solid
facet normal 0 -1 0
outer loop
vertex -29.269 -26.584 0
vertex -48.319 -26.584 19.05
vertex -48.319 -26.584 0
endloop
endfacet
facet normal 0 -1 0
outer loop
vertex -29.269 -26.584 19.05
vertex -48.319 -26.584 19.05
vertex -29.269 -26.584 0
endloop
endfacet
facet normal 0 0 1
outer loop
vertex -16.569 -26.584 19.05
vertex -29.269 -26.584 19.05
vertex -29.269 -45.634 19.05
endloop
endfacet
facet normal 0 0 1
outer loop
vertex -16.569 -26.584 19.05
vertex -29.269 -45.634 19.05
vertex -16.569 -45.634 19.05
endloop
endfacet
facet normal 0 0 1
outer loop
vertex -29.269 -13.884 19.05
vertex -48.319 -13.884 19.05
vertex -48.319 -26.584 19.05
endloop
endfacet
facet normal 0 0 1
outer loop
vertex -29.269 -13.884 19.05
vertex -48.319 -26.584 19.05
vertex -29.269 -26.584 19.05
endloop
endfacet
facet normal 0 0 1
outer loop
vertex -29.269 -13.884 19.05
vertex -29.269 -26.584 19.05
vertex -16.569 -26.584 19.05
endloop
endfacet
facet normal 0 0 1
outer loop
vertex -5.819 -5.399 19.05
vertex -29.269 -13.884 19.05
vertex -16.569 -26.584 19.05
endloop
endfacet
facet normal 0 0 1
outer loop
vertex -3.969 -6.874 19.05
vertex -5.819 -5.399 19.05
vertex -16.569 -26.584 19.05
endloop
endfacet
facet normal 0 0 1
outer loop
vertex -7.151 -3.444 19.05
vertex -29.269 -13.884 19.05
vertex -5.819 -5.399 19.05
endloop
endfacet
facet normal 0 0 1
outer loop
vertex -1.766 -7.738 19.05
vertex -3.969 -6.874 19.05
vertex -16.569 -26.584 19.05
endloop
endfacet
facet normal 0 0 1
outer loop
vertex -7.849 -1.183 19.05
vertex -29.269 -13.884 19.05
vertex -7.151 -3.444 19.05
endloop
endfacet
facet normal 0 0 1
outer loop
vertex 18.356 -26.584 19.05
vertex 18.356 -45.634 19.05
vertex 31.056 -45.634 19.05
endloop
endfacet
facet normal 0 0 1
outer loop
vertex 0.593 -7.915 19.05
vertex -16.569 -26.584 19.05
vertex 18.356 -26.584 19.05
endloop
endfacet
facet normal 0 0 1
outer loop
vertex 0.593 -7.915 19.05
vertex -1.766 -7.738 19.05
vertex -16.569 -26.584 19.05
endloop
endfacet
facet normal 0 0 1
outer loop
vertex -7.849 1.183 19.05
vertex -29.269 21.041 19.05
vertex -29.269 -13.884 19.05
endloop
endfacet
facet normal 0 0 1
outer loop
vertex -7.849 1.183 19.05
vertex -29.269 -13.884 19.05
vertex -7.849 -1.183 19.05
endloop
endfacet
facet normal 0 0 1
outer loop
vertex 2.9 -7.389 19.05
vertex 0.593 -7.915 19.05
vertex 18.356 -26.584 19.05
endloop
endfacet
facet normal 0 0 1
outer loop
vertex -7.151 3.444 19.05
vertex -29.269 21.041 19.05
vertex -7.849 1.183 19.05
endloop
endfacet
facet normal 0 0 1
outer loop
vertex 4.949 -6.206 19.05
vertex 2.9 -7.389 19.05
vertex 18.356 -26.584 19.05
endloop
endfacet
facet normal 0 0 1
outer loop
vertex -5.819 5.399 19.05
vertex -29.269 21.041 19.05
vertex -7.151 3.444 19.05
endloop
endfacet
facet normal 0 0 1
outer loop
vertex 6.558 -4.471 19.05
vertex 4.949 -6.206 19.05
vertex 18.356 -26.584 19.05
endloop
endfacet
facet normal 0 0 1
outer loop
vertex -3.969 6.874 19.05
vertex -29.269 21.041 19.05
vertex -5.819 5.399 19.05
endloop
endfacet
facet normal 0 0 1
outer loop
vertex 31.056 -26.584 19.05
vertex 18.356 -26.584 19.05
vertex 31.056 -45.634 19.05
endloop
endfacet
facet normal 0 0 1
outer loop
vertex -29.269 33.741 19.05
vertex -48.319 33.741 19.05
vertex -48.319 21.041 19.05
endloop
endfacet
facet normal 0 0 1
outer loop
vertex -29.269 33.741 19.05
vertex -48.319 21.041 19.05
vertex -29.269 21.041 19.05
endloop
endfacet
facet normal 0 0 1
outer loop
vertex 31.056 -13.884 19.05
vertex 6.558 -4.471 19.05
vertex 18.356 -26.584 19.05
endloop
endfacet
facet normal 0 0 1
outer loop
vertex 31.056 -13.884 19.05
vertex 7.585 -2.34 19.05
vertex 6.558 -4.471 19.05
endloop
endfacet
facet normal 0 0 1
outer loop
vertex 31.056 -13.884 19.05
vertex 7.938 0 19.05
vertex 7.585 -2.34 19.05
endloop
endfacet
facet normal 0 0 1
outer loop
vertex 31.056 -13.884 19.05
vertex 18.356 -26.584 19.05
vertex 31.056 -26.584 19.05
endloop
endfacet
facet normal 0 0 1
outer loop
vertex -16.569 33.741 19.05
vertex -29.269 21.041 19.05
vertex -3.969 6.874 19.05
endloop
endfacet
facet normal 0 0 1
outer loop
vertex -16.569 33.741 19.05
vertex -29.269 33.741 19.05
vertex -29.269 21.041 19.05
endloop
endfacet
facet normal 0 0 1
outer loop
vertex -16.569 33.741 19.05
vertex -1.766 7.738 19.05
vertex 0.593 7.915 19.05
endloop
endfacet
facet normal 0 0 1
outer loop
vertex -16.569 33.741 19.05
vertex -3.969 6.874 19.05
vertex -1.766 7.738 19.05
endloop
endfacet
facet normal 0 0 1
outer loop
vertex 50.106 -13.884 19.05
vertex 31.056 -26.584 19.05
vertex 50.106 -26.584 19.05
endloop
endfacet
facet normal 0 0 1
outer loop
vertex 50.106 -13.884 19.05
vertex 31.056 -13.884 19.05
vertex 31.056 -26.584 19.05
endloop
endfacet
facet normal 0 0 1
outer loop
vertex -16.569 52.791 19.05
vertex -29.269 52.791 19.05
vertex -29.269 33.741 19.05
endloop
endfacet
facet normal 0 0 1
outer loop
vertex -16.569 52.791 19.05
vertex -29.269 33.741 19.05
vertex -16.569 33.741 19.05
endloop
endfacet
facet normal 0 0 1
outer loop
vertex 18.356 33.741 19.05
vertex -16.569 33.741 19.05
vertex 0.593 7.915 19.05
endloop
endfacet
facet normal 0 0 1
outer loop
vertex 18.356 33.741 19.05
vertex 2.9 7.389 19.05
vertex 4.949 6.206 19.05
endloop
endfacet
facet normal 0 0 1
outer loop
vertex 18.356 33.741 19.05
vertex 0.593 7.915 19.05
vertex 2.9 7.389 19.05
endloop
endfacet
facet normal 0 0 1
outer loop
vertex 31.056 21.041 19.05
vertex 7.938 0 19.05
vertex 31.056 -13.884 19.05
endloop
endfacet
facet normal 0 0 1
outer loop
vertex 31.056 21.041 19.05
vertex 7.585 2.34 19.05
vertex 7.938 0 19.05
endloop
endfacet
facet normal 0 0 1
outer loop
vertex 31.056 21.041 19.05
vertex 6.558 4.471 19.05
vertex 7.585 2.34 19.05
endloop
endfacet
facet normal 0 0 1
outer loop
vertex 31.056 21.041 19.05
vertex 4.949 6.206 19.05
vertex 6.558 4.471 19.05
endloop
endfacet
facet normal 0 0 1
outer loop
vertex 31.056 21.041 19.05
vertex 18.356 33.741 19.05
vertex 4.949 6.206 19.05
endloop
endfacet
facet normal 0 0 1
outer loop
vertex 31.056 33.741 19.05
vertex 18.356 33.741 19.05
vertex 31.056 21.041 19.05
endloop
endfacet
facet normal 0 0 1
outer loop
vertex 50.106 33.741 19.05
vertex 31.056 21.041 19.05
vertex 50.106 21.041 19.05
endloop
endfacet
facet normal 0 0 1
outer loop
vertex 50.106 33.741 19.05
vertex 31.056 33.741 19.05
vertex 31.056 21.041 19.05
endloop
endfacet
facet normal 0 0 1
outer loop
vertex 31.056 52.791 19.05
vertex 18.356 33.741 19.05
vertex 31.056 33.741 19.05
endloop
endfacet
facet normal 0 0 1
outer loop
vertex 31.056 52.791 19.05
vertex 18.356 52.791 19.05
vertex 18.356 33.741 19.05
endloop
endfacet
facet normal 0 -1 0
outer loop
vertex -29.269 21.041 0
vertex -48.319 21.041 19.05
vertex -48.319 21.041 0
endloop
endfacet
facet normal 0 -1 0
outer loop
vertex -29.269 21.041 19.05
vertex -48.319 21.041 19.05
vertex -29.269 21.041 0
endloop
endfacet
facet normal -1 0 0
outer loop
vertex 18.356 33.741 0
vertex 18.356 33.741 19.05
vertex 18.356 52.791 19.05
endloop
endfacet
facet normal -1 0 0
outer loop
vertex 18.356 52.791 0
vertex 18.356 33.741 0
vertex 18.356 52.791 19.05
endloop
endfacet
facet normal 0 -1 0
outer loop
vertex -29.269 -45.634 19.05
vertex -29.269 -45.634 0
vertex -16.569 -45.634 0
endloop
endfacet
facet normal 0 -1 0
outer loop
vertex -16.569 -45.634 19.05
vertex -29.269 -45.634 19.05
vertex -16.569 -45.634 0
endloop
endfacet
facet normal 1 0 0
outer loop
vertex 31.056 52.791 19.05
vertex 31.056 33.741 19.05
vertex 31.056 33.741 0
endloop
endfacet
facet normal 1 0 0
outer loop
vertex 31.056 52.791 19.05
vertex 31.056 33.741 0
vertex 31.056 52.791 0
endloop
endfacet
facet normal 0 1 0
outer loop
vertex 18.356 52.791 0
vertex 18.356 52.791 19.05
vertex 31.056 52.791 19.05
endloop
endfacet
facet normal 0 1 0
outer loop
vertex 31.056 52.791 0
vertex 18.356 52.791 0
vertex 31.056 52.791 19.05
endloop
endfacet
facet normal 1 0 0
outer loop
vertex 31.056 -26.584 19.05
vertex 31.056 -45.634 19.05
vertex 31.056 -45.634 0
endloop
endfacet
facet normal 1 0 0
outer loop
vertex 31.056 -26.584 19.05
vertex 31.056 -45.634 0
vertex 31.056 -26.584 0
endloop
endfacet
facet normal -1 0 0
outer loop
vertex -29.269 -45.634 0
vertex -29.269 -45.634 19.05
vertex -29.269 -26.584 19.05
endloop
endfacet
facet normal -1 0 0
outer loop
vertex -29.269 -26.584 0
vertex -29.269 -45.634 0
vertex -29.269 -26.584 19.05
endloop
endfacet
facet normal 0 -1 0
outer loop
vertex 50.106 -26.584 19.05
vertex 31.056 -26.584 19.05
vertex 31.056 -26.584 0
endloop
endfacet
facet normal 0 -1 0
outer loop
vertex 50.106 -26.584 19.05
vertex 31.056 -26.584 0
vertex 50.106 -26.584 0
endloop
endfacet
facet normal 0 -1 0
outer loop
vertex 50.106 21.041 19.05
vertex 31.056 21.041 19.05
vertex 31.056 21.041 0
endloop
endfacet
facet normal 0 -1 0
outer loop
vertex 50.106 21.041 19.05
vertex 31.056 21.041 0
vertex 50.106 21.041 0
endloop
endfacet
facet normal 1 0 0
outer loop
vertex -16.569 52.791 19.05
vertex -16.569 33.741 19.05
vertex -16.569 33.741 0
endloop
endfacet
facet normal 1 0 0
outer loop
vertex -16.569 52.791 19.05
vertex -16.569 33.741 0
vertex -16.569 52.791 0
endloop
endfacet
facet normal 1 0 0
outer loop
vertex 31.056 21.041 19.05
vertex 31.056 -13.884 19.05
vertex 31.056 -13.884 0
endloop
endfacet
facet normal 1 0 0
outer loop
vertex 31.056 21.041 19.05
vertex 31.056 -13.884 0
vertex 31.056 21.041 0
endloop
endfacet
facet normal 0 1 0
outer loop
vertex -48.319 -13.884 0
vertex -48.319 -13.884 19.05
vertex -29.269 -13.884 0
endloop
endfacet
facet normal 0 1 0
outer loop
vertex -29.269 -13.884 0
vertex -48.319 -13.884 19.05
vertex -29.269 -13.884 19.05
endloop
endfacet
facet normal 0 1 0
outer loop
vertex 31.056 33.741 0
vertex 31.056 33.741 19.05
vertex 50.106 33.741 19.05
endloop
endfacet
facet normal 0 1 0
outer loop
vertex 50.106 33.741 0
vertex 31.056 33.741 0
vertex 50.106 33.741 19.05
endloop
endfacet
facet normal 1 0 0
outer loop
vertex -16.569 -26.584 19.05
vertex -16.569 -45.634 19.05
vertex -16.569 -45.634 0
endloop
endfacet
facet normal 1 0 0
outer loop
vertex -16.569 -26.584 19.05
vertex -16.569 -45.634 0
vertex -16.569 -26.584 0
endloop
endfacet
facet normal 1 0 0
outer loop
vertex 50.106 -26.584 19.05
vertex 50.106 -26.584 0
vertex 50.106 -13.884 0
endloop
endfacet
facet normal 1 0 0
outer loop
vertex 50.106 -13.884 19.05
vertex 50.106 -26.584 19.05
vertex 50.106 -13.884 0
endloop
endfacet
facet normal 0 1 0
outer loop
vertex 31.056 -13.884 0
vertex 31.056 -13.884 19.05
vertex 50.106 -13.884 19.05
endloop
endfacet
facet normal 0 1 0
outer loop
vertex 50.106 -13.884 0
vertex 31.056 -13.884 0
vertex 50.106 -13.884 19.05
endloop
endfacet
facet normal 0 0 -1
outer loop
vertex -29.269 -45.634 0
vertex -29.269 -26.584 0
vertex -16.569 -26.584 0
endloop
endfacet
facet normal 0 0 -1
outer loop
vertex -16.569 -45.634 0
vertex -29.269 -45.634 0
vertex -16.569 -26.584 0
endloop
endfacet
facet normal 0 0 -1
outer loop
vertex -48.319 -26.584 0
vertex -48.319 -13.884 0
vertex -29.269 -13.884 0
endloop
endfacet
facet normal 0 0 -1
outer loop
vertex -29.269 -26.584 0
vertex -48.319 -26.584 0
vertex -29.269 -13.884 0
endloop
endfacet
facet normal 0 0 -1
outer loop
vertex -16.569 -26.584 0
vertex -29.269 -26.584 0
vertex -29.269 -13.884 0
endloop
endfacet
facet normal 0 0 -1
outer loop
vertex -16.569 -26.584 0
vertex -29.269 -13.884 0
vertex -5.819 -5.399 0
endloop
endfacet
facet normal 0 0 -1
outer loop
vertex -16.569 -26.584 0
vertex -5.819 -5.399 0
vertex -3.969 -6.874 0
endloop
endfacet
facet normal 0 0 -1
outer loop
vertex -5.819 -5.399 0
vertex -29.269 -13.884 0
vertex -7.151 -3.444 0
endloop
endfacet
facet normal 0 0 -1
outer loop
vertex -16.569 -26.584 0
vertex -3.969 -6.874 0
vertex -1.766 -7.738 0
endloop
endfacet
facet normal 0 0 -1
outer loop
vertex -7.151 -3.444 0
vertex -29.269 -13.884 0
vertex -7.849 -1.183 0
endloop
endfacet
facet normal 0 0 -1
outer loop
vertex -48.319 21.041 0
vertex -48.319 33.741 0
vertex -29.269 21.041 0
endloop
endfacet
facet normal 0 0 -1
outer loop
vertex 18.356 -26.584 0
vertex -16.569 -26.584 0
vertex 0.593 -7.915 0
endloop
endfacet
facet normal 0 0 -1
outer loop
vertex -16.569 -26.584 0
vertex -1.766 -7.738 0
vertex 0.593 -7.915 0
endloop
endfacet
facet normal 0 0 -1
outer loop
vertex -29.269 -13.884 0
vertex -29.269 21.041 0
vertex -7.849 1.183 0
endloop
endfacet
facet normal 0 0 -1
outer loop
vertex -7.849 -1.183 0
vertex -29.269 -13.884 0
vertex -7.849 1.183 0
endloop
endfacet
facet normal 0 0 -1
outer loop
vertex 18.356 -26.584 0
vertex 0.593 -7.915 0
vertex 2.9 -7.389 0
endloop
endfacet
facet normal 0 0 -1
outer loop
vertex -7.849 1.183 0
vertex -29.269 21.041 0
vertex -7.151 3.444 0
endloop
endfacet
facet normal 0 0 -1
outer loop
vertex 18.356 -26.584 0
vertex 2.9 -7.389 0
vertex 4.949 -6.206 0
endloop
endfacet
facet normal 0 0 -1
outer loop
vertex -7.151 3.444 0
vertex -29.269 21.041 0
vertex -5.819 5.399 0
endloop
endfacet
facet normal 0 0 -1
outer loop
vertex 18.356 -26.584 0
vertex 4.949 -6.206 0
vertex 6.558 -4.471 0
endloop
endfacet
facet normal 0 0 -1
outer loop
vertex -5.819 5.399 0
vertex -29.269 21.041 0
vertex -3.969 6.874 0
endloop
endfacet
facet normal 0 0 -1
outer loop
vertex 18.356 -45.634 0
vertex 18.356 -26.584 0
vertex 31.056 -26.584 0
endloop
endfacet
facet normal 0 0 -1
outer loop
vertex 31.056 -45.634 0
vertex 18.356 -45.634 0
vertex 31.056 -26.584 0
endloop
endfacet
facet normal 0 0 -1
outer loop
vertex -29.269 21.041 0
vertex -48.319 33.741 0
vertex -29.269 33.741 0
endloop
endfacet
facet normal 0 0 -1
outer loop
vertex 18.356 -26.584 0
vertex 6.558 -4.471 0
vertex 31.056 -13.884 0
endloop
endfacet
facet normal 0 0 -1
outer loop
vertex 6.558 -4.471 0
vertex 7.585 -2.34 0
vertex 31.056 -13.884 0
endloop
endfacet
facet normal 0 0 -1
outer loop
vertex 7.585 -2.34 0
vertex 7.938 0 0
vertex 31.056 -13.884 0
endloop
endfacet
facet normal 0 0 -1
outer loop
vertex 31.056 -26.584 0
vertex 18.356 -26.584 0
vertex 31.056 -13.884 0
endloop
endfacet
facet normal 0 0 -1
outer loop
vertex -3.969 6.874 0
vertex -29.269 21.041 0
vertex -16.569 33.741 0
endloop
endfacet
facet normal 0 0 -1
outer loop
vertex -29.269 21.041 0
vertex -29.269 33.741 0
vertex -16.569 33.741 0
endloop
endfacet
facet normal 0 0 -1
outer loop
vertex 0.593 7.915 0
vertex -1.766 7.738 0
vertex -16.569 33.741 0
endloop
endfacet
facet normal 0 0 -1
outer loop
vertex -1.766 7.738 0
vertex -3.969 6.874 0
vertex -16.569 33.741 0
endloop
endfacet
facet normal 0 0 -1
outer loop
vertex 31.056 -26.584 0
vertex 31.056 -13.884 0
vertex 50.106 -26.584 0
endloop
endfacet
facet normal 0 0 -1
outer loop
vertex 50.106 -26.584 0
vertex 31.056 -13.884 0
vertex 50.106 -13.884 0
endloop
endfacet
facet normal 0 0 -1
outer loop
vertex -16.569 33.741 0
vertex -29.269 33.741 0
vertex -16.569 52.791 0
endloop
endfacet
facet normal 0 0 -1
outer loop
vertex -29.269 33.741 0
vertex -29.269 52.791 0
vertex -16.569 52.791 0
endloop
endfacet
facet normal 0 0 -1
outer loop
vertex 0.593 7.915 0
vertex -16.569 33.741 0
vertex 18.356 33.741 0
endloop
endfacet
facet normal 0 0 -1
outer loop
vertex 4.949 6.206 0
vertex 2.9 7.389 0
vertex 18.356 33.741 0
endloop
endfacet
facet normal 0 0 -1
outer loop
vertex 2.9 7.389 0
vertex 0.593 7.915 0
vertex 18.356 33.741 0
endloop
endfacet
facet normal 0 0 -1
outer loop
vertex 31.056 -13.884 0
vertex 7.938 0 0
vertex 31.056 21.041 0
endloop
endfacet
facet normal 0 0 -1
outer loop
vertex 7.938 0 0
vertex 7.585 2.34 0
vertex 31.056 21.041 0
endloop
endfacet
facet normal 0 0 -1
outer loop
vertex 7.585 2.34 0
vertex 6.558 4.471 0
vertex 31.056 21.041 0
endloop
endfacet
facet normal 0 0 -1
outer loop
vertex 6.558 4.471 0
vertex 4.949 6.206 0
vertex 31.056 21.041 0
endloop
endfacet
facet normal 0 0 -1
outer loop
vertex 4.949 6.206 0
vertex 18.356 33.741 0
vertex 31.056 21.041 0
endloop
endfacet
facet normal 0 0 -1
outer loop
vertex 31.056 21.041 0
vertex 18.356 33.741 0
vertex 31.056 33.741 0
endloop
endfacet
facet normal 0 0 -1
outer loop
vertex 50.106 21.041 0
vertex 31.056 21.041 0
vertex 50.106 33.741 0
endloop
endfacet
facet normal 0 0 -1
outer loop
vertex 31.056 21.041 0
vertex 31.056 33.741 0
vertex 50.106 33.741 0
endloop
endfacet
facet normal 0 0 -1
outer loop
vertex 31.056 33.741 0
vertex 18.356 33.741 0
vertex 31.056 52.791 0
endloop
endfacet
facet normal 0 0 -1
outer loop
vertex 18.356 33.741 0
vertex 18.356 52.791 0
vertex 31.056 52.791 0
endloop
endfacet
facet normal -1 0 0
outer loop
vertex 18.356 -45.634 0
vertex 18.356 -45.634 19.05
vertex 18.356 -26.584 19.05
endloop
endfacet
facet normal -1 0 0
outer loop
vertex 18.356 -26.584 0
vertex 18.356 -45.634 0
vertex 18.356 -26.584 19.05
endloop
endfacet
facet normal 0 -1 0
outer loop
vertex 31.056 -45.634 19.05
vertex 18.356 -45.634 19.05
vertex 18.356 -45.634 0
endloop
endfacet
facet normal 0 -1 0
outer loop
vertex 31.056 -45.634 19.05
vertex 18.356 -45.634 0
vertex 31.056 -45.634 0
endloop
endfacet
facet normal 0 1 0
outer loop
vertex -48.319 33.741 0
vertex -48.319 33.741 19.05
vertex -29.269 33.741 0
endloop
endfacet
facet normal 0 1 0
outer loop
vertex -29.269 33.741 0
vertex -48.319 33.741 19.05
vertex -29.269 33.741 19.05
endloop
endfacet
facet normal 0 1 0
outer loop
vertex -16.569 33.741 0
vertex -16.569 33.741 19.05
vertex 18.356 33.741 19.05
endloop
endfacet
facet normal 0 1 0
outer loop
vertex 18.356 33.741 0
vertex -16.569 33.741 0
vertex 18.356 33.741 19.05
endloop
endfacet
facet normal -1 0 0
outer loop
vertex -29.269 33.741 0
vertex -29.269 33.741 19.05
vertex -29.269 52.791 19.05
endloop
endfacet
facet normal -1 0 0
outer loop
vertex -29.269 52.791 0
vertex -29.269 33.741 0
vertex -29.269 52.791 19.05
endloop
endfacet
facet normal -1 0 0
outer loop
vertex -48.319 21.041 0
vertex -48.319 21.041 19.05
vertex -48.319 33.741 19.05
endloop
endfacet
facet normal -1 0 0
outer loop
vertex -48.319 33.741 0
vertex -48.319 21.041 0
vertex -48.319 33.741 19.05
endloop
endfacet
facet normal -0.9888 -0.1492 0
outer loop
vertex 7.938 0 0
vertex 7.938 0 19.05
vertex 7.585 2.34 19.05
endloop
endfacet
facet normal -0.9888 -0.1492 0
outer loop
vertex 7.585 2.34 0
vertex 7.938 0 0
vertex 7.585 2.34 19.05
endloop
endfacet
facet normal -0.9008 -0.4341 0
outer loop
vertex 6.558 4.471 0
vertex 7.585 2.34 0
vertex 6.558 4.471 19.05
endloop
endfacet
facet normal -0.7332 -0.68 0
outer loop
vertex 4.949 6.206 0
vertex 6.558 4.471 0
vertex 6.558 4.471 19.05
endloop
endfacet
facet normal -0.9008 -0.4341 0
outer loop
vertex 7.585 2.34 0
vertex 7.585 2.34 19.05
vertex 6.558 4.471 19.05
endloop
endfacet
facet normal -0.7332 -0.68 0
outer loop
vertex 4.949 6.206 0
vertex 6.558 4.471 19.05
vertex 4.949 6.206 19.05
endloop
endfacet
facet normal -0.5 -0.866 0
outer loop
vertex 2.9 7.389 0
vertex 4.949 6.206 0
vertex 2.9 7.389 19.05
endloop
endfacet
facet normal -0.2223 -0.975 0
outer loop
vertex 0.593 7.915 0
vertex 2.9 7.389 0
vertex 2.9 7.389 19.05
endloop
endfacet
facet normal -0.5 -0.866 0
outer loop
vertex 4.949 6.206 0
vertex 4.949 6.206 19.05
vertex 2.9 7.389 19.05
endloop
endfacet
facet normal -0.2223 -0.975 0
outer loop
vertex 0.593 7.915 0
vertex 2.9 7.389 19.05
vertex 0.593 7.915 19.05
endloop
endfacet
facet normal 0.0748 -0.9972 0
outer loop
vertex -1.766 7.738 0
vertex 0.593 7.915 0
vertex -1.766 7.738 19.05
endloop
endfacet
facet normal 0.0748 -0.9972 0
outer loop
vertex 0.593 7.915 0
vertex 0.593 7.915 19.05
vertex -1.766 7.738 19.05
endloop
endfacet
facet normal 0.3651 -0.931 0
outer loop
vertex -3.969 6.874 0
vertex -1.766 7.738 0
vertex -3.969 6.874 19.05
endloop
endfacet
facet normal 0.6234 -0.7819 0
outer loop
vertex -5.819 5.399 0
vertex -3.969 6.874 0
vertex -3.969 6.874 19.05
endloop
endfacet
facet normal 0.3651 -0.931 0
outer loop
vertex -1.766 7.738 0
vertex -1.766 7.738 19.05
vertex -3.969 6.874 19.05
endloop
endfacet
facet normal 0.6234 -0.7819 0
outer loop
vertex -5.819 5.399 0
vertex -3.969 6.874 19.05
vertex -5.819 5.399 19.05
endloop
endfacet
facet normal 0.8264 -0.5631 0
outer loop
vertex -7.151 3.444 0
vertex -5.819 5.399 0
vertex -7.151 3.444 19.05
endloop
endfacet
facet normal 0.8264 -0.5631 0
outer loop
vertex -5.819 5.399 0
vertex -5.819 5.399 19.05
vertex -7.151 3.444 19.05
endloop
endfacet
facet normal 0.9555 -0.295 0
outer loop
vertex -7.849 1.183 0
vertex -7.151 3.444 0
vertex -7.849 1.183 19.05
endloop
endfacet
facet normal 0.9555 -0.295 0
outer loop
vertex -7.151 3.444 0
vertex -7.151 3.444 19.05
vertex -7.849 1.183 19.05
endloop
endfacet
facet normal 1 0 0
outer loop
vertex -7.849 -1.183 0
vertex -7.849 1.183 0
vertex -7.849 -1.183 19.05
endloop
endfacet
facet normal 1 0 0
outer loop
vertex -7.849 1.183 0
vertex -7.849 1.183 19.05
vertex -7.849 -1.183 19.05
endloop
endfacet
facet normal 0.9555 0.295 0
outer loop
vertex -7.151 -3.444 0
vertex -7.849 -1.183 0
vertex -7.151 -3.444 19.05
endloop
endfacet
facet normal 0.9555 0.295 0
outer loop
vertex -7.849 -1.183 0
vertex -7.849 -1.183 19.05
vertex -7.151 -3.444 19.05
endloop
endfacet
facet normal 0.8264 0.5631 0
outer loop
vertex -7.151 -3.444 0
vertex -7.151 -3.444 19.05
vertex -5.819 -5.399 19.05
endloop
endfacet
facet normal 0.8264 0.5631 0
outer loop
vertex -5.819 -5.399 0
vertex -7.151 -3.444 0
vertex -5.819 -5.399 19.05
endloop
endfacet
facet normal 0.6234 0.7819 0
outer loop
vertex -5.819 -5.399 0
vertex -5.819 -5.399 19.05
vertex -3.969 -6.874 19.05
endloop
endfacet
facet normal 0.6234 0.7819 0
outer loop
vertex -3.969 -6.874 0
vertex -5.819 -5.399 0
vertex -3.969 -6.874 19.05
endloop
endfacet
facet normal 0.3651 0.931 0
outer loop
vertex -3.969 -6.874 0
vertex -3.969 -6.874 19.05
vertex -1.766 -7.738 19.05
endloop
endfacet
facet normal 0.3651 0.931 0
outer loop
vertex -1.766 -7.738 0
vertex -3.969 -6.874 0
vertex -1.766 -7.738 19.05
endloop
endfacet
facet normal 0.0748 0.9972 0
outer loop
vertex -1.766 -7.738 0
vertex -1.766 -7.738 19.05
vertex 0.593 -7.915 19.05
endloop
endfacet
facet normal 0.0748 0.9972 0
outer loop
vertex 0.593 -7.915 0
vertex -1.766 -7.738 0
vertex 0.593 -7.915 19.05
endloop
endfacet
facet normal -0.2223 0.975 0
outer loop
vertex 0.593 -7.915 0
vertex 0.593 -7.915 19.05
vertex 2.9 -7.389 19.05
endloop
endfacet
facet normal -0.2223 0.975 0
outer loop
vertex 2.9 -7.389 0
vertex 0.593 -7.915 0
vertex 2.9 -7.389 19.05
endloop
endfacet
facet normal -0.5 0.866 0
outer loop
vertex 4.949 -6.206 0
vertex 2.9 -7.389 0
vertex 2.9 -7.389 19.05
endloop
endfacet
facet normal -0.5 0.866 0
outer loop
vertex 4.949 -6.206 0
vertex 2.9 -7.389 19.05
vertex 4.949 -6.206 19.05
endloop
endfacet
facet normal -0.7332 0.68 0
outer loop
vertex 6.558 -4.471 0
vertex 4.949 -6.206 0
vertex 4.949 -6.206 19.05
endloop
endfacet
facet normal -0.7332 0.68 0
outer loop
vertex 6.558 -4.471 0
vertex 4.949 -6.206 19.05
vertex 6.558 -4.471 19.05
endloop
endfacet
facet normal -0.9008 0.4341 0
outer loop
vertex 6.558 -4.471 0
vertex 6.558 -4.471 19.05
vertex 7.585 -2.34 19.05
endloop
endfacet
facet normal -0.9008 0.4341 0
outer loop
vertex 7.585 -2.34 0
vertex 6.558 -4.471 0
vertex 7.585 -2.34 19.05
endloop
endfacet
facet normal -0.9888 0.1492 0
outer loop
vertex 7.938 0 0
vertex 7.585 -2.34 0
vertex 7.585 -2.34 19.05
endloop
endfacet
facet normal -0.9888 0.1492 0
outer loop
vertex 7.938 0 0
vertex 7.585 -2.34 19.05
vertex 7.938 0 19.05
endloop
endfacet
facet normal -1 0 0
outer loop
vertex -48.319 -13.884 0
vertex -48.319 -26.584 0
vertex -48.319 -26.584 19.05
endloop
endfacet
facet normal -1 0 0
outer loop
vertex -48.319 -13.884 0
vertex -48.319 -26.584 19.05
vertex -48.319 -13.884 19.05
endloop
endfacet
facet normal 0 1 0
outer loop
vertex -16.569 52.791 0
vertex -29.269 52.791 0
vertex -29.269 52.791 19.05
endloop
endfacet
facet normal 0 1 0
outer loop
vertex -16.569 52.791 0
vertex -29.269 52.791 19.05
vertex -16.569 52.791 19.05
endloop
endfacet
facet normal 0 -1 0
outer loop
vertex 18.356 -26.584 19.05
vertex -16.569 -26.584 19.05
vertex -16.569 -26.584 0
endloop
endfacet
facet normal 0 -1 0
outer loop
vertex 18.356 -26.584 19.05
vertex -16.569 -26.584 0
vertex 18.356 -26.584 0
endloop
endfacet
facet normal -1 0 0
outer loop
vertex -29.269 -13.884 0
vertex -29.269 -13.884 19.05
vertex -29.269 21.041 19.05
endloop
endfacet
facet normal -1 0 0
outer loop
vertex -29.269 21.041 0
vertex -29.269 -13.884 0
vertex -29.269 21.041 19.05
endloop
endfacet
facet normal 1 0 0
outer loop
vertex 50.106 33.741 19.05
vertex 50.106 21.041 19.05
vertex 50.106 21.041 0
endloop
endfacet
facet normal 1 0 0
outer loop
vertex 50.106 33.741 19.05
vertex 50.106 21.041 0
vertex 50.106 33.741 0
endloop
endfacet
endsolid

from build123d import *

# Parameters (mm, degrees)
F0_W     = 98.425
F0_H     = 98.425
F1_DEPTH = 19.05
F2_W     = 19.05
F2_H     = 19.05
F2_H_2   = 34.925
F2_W_2   = 34.925
F3_DEPTH = 19.051
F4_R     = 7.9375
F5_DEPTH = 19.051


with BuildPart() as f1:
    # F0 (on Top) → F1 (new body)
    with BuildSketch(Plane.XY):
        with Locations((0.8939672261, 3.5788302732)):
            Rectangle(F0_W, F0_H)
    extrude(amount=F1_DEPTH)

    # F2 (on face) → F3 (cut, through all)
    with BuildSketch(Plane.XY.offset(19.05)):
        with Locations((-38.7935327739, 43.2663302732)):
            Rectangle(F2_W, F2_H)
        with Locations((40.5814672261, 43.2663302732)):
            Rectangle(F2_W, F2_H)
        with Locations((-38.7935327739, -36.1086697268)):
            Rectangle(F2_W, F2_H)
        with Locations((40.5814672261, -36.1086697268)):
            Rectangle(F2_W, F2_H)
        with Locations((40.5814672261, 3.5788302732)):
            Rectangle(F2_W, F2_H_2)
        with Locations((-38.7935327739, 3.5788302732)):
            Rectangle(F2_W, F2_H_2)
        with Locations((0.8939672261, 43.2663302732)):
            Rectangle(F2_W_2, F2_H)
        with Locations((0.8939672261, -36.1086697268)):
            Rectangle(F2_W_2, F2_H)
    extrude(amount=-F3_DEPTH, mode=Mode.SUBTRACT)

    # F4 (on face) → F5 (cut, through all)
    with BuildSketch(Plane.XY.offset(19.05)):
        Circle(F4_R)
    extrude(amount=-F5_DEPTH, mode=Mode.SUBTRACT)


solid = f1.part
